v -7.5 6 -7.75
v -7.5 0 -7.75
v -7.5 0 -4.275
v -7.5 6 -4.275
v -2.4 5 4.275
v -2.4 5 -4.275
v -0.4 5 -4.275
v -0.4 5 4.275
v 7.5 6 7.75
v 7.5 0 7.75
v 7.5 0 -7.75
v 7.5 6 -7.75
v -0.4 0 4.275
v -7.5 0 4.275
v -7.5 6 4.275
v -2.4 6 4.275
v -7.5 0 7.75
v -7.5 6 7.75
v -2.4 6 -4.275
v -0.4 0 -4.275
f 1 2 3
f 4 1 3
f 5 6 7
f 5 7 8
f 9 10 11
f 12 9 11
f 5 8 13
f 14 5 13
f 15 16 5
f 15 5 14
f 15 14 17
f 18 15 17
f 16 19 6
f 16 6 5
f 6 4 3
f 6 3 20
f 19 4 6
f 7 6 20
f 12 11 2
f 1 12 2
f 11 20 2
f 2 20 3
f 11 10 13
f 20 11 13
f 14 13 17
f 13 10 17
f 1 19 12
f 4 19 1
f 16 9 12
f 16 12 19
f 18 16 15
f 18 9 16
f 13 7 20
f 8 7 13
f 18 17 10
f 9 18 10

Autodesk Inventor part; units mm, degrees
ref_plane "YZ Plane" through (0, 0, 0) normal (1, 0, 0) x (0, 1, 0)
ref_plane "XZ Plane" through (0, 0, 0) normal (0, 1, 0) x (-1, 0, 0)
ref_plane "XY Plane" through (0, 0, 0) normal (0, 0, 1) x (1, 0, 0)
sketch "Sketch1" plane through (0, 0, 0) normal (0, 1, 0) x (-1, 0, 0)
  line L0 (7.5, 7.75) -> (-7.5, 7.75)
  line L1 (-7.5, 7.75) -> (-7.5, -7.75)
  line L2 (-7.5, -7.75) -> (7.5, -7.75)
  line L3 (7.5, -7.75) -> (7.5, 7.75)
  line L4 (7.5, 7.75) -> (-7.5, -7.75) construction
  line L5 (-7.5, 7.75) -> (7.5, -7.75) construction
  point P0 (0, 0)
  dimension "d0" = 15
  dimension "d1" = 15.5
extrude "Extrusion1" add sketch "Sketch1" along normal blind 6
sketch "Sketch2" plane through (0, 6, 0) normal (0, 1, 0) x (1, 0, 0)
  line L0 (7.5, -7.75) -> (7.5, 7.75) projected
  line L1 (-7.5, 7.75) -> (-7.5, -7.75) projected
  line L2 (-7.5, 4.275) -> (-2.4, 4.275)
  line L3 (-2.4, 4.275) -> (-2.4, -4.275)
  line L4 (-2.4, -4.275) -> (-7.5, -4.275)
  line L5 (-7.5, 0) -> (-2.4, -4.275) construction
  line L6 (-2.4, 4.275) -> (-7.5, 0) construction
  line L7 (-7.5, 4.275) -> (-7.5, -4.275)
  point P0 (0, 0)
  point P1 (-7.5, 0)
  dimension "d4" = 15
  dimension "d5" = 5.1
  dimension "d6" = 8.55
extrude "Extrusion2" cut sketch "Sketch2" against normal blind 8.25
sketch "Sketch3" plane through (-2.4, 6, -4.275) normal (-1, 0, 0) x (0, 0, 1)
  line L0 (0, -1) -> (8.55, -1)
  line L1 (8.55, -1) -> (8.55, -6)
  line L2 (0, -6) -> (0, -1)
  line L3 (0, -1) -> (4.275, -6) construction
  line L4 (8.55, -1) -> (4.275, -6) construction
  line L5 (0, -6) -> (8.55, -6)
  dimension "d9" = 5
extrude "Extrusion3" cut sketch "Sketch3" against normal blind 2
properties part number "TAPA3_3DPrint"
